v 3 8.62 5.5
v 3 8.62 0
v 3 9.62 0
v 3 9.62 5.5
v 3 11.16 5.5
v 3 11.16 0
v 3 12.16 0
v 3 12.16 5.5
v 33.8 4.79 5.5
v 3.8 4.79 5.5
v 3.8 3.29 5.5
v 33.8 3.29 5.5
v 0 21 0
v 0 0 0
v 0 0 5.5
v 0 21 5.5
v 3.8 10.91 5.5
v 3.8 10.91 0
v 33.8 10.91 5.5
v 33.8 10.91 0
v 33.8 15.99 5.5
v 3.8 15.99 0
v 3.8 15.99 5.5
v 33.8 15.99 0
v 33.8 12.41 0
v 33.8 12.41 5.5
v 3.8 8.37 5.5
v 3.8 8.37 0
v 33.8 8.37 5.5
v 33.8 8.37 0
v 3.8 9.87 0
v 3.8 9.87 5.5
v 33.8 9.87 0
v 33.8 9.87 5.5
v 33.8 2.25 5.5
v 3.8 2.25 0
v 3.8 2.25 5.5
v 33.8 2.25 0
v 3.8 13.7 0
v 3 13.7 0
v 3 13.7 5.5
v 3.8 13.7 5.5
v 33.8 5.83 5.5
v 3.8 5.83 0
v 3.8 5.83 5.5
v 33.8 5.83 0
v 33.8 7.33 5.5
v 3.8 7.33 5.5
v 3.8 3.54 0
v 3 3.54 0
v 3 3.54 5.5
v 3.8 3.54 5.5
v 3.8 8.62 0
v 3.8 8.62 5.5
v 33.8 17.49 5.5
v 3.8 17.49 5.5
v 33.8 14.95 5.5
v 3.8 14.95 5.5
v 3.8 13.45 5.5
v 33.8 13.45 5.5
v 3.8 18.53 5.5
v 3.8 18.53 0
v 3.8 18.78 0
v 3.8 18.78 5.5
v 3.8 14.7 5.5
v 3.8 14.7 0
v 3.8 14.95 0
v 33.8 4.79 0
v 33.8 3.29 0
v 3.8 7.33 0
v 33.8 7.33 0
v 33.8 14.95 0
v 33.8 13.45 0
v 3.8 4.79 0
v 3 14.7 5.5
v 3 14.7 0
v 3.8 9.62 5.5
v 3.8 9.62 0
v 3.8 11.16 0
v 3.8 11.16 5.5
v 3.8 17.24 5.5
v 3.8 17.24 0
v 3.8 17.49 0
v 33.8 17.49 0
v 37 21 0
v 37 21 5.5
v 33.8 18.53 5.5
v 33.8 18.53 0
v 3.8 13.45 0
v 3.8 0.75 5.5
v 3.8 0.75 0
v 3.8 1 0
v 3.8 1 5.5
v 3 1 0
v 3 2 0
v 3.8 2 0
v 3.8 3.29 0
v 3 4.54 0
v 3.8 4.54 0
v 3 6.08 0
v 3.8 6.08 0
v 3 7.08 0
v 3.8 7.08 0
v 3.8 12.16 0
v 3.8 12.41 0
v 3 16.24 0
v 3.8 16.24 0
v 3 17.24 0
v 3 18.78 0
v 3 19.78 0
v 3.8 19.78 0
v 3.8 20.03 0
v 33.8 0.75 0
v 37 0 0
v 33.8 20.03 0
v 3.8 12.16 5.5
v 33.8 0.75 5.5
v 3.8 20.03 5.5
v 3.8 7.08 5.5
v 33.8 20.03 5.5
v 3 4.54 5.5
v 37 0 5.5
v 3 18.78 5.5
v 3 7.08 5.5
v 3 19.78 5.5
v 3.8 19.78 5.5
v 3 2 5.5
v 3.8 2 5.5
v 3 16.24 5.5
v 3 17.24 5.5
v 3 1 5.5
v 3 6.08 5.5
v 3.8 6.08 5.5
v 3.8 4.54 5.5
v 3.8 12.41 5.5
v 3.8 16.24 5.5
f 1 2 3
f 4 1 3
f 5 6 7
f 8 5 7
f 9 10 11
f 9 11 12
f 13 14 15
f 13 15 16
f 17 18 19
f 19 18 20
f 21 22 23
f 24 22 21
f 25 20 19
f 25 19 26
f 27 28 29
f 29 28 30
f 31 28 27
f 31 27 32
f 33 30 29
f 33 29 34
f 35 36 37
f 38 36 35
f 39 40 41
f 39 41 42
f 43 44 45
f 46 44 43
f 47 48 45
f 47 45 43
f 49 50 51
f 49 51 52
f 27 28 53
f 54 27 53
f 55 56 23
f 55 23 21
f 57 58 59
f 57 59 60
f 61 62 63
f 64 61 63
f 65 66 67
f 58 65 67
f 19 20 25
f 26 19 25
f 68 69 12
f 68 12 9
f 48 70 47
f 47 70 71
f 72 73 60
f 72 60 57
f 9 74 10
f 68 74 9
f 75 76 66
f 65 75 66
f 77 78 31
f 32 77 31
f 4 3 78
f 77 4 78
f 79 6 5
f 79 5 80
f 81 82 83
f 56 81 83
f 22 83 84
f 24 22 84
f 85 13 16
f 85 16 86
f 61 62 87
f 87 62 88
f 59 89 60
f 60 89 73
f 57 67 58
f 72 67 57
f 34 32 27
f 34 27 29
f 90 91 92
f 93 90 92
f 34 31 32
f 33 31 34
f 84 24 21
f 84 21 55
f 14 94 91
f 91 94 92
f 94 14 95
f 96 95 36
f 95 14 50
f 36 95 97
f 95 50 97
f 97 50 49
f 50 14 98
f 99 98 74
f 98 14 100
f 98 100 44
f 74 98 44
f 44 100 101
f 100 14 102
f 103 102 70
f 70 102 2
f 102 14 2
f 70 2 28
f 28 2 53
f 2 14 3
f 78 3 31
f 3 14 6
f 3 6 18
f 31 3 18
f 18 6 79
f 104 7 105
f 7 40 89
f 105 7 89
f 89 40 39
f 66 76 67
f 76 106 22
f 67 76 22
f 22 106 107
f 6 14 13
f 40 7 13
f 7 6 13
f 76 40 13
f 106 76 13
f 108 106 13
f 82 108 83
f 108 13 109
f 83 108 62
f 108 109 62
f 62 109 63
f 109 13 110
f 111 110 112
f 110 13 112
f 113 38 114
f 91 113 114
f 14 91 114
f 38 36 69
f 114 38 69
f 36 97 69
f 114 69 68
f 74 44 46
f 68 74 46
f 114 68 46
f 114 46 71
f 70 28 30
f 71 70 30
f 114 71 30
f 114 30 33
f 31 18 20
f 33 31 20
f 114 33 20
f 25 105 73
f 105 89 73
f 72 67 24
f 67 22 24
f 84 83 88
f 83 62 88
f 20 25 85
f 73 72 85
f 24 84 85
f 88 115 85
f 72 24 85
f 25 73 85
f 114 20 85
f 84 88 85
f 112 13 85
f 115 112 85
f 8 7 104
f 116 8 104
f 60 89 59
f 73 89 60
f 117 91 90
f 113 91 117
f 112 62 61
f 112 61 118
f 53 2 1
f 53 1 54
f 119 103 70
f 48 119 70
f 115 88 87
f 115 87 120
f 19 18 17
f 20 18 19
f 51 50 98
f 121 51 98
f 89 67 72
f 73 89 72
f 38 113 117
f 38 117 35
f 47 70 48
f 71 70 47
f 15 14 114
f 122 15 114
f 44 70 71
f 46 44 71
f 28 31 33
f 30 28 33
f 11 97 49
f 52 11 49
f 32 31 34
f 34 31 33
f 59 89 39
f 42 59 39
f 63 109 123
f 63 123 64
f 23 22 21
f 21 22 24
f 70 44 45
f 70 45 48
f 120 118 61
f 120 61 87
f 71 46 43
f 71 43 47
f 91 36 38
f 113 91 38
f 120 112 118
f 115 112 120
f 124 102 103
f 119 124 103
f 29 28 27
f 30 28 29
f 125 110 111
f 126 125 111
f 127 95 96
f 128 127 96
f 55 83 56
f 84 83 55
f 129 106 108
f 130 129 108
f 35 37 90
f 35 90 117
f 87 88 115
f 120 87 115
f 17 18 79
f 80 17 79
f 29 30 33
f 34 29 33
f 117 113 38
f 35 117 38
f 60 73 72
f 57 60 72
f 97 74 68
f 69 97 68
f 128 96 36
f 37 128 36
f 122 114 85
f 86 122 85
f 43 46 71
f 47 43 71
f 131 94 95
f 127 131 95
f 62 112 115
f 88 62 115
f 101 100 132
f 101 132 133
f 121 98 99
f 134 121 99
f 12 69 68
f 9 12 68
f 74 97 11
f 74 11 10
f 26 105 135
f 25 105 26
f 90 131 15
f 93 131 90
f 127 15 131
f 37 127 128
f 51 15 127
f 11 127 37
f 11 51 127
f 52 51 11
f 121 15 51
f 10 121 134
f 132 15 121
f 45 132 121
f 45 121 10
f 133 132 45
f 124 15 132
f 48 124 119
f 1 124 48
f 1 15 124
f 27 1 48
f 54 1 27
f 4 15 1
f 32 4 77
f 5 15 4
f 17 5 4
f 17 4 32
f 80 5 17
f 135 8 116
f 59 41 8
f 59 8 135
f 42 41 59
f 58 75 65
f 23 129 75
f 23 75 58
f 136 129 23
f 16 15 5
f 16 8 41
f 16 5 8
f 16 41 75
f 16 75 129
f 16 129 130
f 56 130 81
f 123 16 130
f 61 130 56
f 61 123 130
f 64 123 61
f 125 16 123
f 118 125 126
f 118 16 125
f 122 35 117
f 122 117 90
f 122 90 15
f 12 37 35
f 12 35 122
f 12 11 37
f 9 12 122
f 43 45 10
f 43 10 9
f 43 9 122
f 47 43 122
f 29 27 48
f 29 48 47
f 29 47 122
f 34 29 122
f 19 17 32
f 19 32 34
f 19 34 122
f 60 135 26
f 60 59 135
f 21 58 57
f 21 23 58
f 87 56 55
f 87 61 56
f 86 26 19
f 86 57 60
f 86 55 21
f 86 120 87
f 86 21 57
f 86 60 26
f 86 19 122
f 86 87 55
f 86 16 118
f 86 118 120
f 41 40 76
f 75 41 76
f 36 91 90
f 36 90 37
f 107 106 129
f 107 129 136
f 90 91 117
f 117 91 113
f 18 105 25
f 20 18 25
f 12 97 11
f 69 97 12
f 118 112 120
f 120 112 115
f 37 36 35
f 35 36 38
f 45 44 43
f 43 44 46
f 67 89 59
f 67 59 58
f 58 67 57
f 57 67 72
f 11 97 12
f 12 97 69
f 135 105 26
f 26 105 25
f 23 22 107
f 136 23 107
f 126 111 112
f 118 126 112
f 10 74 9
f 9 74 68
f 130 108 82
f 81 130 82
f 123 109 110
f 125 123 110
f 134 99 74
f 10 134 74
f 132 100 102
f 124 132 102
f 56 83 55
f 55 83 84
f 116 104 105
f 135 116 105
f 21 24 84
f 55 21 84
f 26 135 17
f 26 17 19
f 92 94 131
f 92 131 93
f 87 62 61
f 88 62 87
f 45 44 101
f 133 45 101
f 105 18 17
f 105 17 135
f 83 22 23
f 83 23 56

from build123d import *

# Parameters (mm, degrees)
BOX010_W     = 30
BOX010_H     = 1.5
BOX010_DEPTH = 5.5
BOX011_W     = 30
BOX011_H     = 1.5
BOX011_DEPTH = 5.5
BOX012_W     = 30
BOX012_H     = 1.5
BOX012_DEPTH = 5.5
BOX013_W     = 30
BOX013_H     = 1.5
BOX013_DEPTH = 5.5
BOX014_W     = 30
BOX014_H     = 1.5
BOX014_DEPTH = 5.5
BOX015_W     = 30
BOX015_H     = 1.5
BOX015_DEPTH = 5.5
BOX016_W     = 30
BOX016_H     = 1.5
BOX016_DEPTH = 5.5
BOX009_W     = 30
BOX009_H     = 1.5
BOX009_DEPTH = 5.5
BOX018_W     = 30
BOX018_H     = 1.5
BOX018_DEPTH = 5.5
BOX019_W     = 30
BOX019_H     = 1.5
BOX019_DEPTH = 5.5
BOX020_W     = 30
BOX020_H     = 1.5
BOX020_DEPTH = 5.5
BOX021_W     = 30
BOX021_H     = 1.5
BOX021_DEPTH = 5.5
BOX022_W     = 30
BOX022_H     = 1.5
BOX022_DEPTH = 5.5
BOX023_W     = 30
BOX023_H     = 1.5
BOX023_DEPTH = 5.5
BOX024_W     = 30
BOX024_H     = 1.5
BOX024_DEPTH = 5.5
BOX017_W     = 30
BOX017_H     = 1.5
BOX017_DEPTH = 5.5
BOX002_W     = 0.8
BOX002_H     = 1
BOX002_DEPTH = 10
BOX003_W     = 0.8
BOX003_H     = 1
BOX003_DEPTH = 10
BOX004_W     = 0.8
BOX004_H     = 1
BOX004_DEPTH = 10
BOX005_W     = 0.8
BOX005_H     = 1
BOX005_DEPTH = 10
BOX006_W     = 0.8
BOX006_H     = 1
BOX006_DEPTH = 10
BOX007_W     = 0.8
BOX007_H     = 1
BOX007_DEPTH = 10
BOX008_W     = 0.8
BOX008_H     = 1
BOX008_DEPTH = 10
BOX001_W     = 0.8
BOX001_H     = 1
BOX001_DEPTH = 10
BOX_W        = 37
BOX_H        = 21
BOX_DEPTH    = 5.5


with BuildPart() as cube010:
    # Box010 → Box010 (new body)
    with BuildSketch(Plane(origin=(3.8, 3.29, 0), x_dir=(1, 0, 0), z_dir=(0, 0, 1))):
        with Locations((15, 0.75)):
            Rectangle(BOX010_W, BOX010_H)
    extrude(amount=BOX010_DEPTH)


with BuildPart() as cube011:
    # Box011 → Box011 (new body)
    with BuildSketch(Plane(origin=(3.8, 5.83, 0), x_dir=(1, 0, 0), z_dir=(0, 0, 1))):
        with Locations((15, 0.75)):
            Rectangle(BOX011_W, BOX011_H)
    extrude(amount=BOX011_DEPTH)


with BuildPart() as cube012:
    # Box012 → Box012 (new body)
    with BuildSketch(Plane(origin=(3.8, 8.37, 0), x_dir=(1, 0, 0), z_dir=(0, 0, 1))):
        with Locations((15, 0.75)):
            Rectangle(BOX012_W, BOX012_H)
    extrude(amount=BOX012_DEPTH)


with BuildPart() as cube013:
    # Box013 → Box013 (new body)
    with BuildSketch(Plane(origin=(3.8, 10.91, 0), x_dir=(1, 0, 0), z_dir=(0, 0, 1))):
        with Locations((15, 0.75)):
            Rectangle(BOX013_W, BOX013_H)
    extrude(amount=BOX013_DEPTH)


with BuildPart() as cube014:
    # Box014 → Box014 (new body)
    with BuildSketch(Plane(origin=(3.8, 13.45, 0), x_dir=(1, 0, 0), z_dir=(0, 0, 1))):
        with Locations((15, 0.75)):
            Rectangle(BOX014_W, BOX014_H)
    extrude(amount=BOX014_DEPTH)


with BuildPart() as cube015:
    # Box015 → Box015 (new body)
    with BuildSketch(Plane(origin=(3.8, 15.99, 0), x_dir=(1, 0, 0), z_dir=(0, 0, 1))):
        with Locations((15, 0.75)):
            Rectangle(BOX015_W, BOX015_H)
    extrude(amount=BOX015_DEPTH)


with BuildPart() as cube016:
    # Box016 → Box016 (new body)
    with BuildSketch(Plane(origin=(3.8, 18.53, 0), x_dir=(1, 0, 0), z_dir=(0, 0, 1))):
        with Locations((15, 0.75)):
            Rectangle(BOX016_W, BOX016_H)
    extrude(amount=BOX016_DEPTH)


with BuildPart() as conducting_filament:
    # Box009 → Box009 (new body)
    with BuildSketch(Plane(origin=(3.8, 0.75, 0), x_dir=(1, 0, 0), z_dir=(0, 0, 1))):
        with Locations((15, 0.75)):
            Rectangle(BOX009_W, BOX009_H)
    extrude(amount=BOX009_DEPTH)

    # Fusion: union Cube010, Cube011, Cube012, Cube013, Cube014, Cube015, Cube016
    add(cube010.part)
    add(cube011.part)
    add(cube012.part)
    add(cube013.part)
    add(cube014.part)
    add(cube015.part)
    add(cube016.part)


with BuildPart() as cube018:
    # Box018 → Box018 (new body)
    with BuildSketch(Plane(origin=(3.8, 10.91, 0), x_dir=(1, 0, 0), z_dir=(0, 0, 1))):
        with Locations((15, 0.75)):
            Rectangle(BOX018_W, BOX018_H)
    extrude(amount=BOX018_DEPTH)


with BuildPart() as cube019:
    # Box019 → Box019 (new body)
    with BuildSketch(Plane(origin=(3.8, 3.29, 0), x_dir=(1, 0, 0), z_dir=(0, 0, 1))):
        with Locations((15, 0.75)):
            Rectangle(BOX019_W, BOX019_H)
    extrude(amount=BOX019_DEPTH)


with BuildPart() as cube020:
    # Box020 → Box020 (new body)
    with BuildSketch(Plane(origin=(3.8, 5.83, 0), x_dir=(1, 0, 0), z_dir=(0, 0, 1))):
        with Locations((15, 0.75)):
            Rectangle(BOX020_W, BOX020_H)
    extrude(amount=BOX020_DEPTH)


with BuildPart() as cube021:
    # Box021 → Box021 (new body)
    with BuildSketch(Plane(origin=(3.8, 18.53, 0), x_dir=(1, 0, 0), z_dir=(0, 0, 1))):
        with Locations((15, 0.75)):
            Rectangle(BOX021_W, BOX021_H)
    extrude(amount=BOX021_DEPTH)


with BuildPart() as cube022:
    # Box022 → Box022 (new body)
    with BuildSketch(Plane(origin=(3.8, 15.99, 0), x_dir=(1, 0, 0), z_dir=(0, 0, 1))):
        with Locations((15, 0.75)):
            Rectangle(BOX022_W, BOX022_H)
    extrude(amount=BOX022_DEPTH)


with BuildPart() as cube023:
    # Box023 → Box023 (new body)
    with BuildSketch(Plane(origin=(3.8, 8.37, 0), x_dir=(1, 0, 0), z_dir=(0, 0, 1))):
        with Locations((15, 0.75)):
            Rectangle(BOX023_W, BOX023_H)
    extrude(amount=BOX023_DEPTH)


with BuildPart() as cube024:
    # Box024 → Box024 (new body)
    with BuildSketch(Plane(origin=(3.8, 13.45, 0), x_dir=(1, 0, 0), z_dir=(0, 0, 1))):
        with Locations((15, 0.75)):
            Rectangle(BOX024_W, BOX024_H)
    extrude(amount=BOX024_DEPTH)


with BuildPart() as fusion002:
    # Box017 → Box017 (new body)
    with BuildSketch(Plane(origin=(3.8, 0.75, 0), x_dir=(1, 0, 0), z_dir=(0, 0, 1))):
        with Locations((15, 0.75)):
            Rectangle(BOX017_W, BOX017_H)
    extrude(amount=BOX017_DEPTH)

    # Fusion002: union Cube018, Cube019, Cube020, Cube021, Cube022, Cube023, Cube024
    add(cube018.part)
    add(cube019.part)
    add(cube020.part)
    add(cube021.part)
    add(cube022.part)
    add(cube023.part)
    add(cube024.part)


with BuildPart() as cube002:
    # Box002 → Box002 (new body)
    with BuildSketch(Plane(origin=(3, 3.54, -3), x_dir=(1, 0, 0), z_dir=(0, 0, 1))):
        with Locations((0.4, 0.5)):
            Rectangle(BOX002_W, BOX002_H)
    extrude(amount=BOX002_DEPTH)


with BuildPart() as cube003:
    # Box003 → Box003 (new body)
    with BuildSketch(Plane(origin=(3, 6.08, -3), x_dir=(1, 0, 0), z_dir=(0, 0, 1))):
        with Locations((0.4, 0.5)):
            Rectangle(BOX003_W, BOX003_H)
    extrude(amount=BOX003_DEPTH)


with BuildPart() as cube004:
    # Box004 → Box004 (new body)
    with BuildSketch(Plane(origin=(3, 8.62, -3), x_dir=(1, 0, 0), z_dir=(0, 0, 1))):
        with Locations((0.4, 0.5)):
            Rectangle(BOX004_W, BOX004_H)
    extrude(amount=BOX004_DEPTH)


with BuildPart() as cube005:
    # Box005 → Box005 (new body)
    with BuildSketch(Plane(origin=(3, 11.16, -3), x_dir=(1, 0, 0), z_dir=(0, 0, 1))):
        with Locations((0.4, 0.5)):
            Rectangle(BOX005_W, BOX005_H)
    extrude(amount=BOX005_DEPTH)


with BuildPart() as cube006:
    # Box006 → Box006 (new body)
    with BuildSketch(Plane(origin=(3, 13.7, -3), x_dir=(1, 0, 0), z_dir=(0, 0, 1))):
        with Locations((0.4, 0.5)):
            Rectangle(BOX006_W, BOX006_H)
    extrude(amount=BOX006_DEPTH)


with BuildPart() as cube007:
    # Box007 → Box007 (new body)
    with BuildSketch(Plane(origin=(3, 16.24, -3), x_dir=(1, 0, 0), z_dir=(0, 0, 1))):
        with Locations((0.4, 0.5)):
            Rectangle(BOX007_W, BOX007_H)
    extrude(amount=BOX007_DEPTH)


with BuildPart() as cube008:
    # Box008 → Box008 (new body)
    with BuildSketch(Plane(origin=(3, 18.78, -3), x_dir=(1, 0, 0), z_dir=(0, 0, 1))):
        with Locations((0.4, 0.5)):
            Rectangle(BOX008_W, BOX008_H)
    extrude(amount=BOX008_DEPTH)


with BuildPart() as fusion001:
    # Box001 → Box001 (new body)
    with BuildSketch(Plane(origin=(3, 1, -3), x_dir=(1, 0, 0), z_dir=(0, 0, 1))):
        with Locations((0.4, 0.5)):
            Rectangle(BOX001_W, BOX001_H)
    extrude(amount=BOX001_DEPTH)

    # Fusion001: union Cube002, Cube003, Cube004, Cube005, Cube006, Cube007, Cube008
    add(cube002.part)
    add(cube003.part)
    add(cube004.part)
    add(cube005.part)
    add(cube006.part)
    add(cube007.part)
    add(cube008.part)


with BuildPart() as main_body:
    # Box → Box (new body)
    with BuildSketch(Plane.XY):
        with Locations((18.5, 10.5)):
            Rectangle(BOX_W, BOX_H)
    extrude(amount=BOX_DEPTH)

    # Cut: cut Fusion001
    add(fusion001.part, mode=Mode.SUBTRACT)

    # Cut001: cut Fusion002
    add(fusion002.part, mode=Mode.SUBTRACT)


solid = Compound([conducting_filament.part, main_body.part])
